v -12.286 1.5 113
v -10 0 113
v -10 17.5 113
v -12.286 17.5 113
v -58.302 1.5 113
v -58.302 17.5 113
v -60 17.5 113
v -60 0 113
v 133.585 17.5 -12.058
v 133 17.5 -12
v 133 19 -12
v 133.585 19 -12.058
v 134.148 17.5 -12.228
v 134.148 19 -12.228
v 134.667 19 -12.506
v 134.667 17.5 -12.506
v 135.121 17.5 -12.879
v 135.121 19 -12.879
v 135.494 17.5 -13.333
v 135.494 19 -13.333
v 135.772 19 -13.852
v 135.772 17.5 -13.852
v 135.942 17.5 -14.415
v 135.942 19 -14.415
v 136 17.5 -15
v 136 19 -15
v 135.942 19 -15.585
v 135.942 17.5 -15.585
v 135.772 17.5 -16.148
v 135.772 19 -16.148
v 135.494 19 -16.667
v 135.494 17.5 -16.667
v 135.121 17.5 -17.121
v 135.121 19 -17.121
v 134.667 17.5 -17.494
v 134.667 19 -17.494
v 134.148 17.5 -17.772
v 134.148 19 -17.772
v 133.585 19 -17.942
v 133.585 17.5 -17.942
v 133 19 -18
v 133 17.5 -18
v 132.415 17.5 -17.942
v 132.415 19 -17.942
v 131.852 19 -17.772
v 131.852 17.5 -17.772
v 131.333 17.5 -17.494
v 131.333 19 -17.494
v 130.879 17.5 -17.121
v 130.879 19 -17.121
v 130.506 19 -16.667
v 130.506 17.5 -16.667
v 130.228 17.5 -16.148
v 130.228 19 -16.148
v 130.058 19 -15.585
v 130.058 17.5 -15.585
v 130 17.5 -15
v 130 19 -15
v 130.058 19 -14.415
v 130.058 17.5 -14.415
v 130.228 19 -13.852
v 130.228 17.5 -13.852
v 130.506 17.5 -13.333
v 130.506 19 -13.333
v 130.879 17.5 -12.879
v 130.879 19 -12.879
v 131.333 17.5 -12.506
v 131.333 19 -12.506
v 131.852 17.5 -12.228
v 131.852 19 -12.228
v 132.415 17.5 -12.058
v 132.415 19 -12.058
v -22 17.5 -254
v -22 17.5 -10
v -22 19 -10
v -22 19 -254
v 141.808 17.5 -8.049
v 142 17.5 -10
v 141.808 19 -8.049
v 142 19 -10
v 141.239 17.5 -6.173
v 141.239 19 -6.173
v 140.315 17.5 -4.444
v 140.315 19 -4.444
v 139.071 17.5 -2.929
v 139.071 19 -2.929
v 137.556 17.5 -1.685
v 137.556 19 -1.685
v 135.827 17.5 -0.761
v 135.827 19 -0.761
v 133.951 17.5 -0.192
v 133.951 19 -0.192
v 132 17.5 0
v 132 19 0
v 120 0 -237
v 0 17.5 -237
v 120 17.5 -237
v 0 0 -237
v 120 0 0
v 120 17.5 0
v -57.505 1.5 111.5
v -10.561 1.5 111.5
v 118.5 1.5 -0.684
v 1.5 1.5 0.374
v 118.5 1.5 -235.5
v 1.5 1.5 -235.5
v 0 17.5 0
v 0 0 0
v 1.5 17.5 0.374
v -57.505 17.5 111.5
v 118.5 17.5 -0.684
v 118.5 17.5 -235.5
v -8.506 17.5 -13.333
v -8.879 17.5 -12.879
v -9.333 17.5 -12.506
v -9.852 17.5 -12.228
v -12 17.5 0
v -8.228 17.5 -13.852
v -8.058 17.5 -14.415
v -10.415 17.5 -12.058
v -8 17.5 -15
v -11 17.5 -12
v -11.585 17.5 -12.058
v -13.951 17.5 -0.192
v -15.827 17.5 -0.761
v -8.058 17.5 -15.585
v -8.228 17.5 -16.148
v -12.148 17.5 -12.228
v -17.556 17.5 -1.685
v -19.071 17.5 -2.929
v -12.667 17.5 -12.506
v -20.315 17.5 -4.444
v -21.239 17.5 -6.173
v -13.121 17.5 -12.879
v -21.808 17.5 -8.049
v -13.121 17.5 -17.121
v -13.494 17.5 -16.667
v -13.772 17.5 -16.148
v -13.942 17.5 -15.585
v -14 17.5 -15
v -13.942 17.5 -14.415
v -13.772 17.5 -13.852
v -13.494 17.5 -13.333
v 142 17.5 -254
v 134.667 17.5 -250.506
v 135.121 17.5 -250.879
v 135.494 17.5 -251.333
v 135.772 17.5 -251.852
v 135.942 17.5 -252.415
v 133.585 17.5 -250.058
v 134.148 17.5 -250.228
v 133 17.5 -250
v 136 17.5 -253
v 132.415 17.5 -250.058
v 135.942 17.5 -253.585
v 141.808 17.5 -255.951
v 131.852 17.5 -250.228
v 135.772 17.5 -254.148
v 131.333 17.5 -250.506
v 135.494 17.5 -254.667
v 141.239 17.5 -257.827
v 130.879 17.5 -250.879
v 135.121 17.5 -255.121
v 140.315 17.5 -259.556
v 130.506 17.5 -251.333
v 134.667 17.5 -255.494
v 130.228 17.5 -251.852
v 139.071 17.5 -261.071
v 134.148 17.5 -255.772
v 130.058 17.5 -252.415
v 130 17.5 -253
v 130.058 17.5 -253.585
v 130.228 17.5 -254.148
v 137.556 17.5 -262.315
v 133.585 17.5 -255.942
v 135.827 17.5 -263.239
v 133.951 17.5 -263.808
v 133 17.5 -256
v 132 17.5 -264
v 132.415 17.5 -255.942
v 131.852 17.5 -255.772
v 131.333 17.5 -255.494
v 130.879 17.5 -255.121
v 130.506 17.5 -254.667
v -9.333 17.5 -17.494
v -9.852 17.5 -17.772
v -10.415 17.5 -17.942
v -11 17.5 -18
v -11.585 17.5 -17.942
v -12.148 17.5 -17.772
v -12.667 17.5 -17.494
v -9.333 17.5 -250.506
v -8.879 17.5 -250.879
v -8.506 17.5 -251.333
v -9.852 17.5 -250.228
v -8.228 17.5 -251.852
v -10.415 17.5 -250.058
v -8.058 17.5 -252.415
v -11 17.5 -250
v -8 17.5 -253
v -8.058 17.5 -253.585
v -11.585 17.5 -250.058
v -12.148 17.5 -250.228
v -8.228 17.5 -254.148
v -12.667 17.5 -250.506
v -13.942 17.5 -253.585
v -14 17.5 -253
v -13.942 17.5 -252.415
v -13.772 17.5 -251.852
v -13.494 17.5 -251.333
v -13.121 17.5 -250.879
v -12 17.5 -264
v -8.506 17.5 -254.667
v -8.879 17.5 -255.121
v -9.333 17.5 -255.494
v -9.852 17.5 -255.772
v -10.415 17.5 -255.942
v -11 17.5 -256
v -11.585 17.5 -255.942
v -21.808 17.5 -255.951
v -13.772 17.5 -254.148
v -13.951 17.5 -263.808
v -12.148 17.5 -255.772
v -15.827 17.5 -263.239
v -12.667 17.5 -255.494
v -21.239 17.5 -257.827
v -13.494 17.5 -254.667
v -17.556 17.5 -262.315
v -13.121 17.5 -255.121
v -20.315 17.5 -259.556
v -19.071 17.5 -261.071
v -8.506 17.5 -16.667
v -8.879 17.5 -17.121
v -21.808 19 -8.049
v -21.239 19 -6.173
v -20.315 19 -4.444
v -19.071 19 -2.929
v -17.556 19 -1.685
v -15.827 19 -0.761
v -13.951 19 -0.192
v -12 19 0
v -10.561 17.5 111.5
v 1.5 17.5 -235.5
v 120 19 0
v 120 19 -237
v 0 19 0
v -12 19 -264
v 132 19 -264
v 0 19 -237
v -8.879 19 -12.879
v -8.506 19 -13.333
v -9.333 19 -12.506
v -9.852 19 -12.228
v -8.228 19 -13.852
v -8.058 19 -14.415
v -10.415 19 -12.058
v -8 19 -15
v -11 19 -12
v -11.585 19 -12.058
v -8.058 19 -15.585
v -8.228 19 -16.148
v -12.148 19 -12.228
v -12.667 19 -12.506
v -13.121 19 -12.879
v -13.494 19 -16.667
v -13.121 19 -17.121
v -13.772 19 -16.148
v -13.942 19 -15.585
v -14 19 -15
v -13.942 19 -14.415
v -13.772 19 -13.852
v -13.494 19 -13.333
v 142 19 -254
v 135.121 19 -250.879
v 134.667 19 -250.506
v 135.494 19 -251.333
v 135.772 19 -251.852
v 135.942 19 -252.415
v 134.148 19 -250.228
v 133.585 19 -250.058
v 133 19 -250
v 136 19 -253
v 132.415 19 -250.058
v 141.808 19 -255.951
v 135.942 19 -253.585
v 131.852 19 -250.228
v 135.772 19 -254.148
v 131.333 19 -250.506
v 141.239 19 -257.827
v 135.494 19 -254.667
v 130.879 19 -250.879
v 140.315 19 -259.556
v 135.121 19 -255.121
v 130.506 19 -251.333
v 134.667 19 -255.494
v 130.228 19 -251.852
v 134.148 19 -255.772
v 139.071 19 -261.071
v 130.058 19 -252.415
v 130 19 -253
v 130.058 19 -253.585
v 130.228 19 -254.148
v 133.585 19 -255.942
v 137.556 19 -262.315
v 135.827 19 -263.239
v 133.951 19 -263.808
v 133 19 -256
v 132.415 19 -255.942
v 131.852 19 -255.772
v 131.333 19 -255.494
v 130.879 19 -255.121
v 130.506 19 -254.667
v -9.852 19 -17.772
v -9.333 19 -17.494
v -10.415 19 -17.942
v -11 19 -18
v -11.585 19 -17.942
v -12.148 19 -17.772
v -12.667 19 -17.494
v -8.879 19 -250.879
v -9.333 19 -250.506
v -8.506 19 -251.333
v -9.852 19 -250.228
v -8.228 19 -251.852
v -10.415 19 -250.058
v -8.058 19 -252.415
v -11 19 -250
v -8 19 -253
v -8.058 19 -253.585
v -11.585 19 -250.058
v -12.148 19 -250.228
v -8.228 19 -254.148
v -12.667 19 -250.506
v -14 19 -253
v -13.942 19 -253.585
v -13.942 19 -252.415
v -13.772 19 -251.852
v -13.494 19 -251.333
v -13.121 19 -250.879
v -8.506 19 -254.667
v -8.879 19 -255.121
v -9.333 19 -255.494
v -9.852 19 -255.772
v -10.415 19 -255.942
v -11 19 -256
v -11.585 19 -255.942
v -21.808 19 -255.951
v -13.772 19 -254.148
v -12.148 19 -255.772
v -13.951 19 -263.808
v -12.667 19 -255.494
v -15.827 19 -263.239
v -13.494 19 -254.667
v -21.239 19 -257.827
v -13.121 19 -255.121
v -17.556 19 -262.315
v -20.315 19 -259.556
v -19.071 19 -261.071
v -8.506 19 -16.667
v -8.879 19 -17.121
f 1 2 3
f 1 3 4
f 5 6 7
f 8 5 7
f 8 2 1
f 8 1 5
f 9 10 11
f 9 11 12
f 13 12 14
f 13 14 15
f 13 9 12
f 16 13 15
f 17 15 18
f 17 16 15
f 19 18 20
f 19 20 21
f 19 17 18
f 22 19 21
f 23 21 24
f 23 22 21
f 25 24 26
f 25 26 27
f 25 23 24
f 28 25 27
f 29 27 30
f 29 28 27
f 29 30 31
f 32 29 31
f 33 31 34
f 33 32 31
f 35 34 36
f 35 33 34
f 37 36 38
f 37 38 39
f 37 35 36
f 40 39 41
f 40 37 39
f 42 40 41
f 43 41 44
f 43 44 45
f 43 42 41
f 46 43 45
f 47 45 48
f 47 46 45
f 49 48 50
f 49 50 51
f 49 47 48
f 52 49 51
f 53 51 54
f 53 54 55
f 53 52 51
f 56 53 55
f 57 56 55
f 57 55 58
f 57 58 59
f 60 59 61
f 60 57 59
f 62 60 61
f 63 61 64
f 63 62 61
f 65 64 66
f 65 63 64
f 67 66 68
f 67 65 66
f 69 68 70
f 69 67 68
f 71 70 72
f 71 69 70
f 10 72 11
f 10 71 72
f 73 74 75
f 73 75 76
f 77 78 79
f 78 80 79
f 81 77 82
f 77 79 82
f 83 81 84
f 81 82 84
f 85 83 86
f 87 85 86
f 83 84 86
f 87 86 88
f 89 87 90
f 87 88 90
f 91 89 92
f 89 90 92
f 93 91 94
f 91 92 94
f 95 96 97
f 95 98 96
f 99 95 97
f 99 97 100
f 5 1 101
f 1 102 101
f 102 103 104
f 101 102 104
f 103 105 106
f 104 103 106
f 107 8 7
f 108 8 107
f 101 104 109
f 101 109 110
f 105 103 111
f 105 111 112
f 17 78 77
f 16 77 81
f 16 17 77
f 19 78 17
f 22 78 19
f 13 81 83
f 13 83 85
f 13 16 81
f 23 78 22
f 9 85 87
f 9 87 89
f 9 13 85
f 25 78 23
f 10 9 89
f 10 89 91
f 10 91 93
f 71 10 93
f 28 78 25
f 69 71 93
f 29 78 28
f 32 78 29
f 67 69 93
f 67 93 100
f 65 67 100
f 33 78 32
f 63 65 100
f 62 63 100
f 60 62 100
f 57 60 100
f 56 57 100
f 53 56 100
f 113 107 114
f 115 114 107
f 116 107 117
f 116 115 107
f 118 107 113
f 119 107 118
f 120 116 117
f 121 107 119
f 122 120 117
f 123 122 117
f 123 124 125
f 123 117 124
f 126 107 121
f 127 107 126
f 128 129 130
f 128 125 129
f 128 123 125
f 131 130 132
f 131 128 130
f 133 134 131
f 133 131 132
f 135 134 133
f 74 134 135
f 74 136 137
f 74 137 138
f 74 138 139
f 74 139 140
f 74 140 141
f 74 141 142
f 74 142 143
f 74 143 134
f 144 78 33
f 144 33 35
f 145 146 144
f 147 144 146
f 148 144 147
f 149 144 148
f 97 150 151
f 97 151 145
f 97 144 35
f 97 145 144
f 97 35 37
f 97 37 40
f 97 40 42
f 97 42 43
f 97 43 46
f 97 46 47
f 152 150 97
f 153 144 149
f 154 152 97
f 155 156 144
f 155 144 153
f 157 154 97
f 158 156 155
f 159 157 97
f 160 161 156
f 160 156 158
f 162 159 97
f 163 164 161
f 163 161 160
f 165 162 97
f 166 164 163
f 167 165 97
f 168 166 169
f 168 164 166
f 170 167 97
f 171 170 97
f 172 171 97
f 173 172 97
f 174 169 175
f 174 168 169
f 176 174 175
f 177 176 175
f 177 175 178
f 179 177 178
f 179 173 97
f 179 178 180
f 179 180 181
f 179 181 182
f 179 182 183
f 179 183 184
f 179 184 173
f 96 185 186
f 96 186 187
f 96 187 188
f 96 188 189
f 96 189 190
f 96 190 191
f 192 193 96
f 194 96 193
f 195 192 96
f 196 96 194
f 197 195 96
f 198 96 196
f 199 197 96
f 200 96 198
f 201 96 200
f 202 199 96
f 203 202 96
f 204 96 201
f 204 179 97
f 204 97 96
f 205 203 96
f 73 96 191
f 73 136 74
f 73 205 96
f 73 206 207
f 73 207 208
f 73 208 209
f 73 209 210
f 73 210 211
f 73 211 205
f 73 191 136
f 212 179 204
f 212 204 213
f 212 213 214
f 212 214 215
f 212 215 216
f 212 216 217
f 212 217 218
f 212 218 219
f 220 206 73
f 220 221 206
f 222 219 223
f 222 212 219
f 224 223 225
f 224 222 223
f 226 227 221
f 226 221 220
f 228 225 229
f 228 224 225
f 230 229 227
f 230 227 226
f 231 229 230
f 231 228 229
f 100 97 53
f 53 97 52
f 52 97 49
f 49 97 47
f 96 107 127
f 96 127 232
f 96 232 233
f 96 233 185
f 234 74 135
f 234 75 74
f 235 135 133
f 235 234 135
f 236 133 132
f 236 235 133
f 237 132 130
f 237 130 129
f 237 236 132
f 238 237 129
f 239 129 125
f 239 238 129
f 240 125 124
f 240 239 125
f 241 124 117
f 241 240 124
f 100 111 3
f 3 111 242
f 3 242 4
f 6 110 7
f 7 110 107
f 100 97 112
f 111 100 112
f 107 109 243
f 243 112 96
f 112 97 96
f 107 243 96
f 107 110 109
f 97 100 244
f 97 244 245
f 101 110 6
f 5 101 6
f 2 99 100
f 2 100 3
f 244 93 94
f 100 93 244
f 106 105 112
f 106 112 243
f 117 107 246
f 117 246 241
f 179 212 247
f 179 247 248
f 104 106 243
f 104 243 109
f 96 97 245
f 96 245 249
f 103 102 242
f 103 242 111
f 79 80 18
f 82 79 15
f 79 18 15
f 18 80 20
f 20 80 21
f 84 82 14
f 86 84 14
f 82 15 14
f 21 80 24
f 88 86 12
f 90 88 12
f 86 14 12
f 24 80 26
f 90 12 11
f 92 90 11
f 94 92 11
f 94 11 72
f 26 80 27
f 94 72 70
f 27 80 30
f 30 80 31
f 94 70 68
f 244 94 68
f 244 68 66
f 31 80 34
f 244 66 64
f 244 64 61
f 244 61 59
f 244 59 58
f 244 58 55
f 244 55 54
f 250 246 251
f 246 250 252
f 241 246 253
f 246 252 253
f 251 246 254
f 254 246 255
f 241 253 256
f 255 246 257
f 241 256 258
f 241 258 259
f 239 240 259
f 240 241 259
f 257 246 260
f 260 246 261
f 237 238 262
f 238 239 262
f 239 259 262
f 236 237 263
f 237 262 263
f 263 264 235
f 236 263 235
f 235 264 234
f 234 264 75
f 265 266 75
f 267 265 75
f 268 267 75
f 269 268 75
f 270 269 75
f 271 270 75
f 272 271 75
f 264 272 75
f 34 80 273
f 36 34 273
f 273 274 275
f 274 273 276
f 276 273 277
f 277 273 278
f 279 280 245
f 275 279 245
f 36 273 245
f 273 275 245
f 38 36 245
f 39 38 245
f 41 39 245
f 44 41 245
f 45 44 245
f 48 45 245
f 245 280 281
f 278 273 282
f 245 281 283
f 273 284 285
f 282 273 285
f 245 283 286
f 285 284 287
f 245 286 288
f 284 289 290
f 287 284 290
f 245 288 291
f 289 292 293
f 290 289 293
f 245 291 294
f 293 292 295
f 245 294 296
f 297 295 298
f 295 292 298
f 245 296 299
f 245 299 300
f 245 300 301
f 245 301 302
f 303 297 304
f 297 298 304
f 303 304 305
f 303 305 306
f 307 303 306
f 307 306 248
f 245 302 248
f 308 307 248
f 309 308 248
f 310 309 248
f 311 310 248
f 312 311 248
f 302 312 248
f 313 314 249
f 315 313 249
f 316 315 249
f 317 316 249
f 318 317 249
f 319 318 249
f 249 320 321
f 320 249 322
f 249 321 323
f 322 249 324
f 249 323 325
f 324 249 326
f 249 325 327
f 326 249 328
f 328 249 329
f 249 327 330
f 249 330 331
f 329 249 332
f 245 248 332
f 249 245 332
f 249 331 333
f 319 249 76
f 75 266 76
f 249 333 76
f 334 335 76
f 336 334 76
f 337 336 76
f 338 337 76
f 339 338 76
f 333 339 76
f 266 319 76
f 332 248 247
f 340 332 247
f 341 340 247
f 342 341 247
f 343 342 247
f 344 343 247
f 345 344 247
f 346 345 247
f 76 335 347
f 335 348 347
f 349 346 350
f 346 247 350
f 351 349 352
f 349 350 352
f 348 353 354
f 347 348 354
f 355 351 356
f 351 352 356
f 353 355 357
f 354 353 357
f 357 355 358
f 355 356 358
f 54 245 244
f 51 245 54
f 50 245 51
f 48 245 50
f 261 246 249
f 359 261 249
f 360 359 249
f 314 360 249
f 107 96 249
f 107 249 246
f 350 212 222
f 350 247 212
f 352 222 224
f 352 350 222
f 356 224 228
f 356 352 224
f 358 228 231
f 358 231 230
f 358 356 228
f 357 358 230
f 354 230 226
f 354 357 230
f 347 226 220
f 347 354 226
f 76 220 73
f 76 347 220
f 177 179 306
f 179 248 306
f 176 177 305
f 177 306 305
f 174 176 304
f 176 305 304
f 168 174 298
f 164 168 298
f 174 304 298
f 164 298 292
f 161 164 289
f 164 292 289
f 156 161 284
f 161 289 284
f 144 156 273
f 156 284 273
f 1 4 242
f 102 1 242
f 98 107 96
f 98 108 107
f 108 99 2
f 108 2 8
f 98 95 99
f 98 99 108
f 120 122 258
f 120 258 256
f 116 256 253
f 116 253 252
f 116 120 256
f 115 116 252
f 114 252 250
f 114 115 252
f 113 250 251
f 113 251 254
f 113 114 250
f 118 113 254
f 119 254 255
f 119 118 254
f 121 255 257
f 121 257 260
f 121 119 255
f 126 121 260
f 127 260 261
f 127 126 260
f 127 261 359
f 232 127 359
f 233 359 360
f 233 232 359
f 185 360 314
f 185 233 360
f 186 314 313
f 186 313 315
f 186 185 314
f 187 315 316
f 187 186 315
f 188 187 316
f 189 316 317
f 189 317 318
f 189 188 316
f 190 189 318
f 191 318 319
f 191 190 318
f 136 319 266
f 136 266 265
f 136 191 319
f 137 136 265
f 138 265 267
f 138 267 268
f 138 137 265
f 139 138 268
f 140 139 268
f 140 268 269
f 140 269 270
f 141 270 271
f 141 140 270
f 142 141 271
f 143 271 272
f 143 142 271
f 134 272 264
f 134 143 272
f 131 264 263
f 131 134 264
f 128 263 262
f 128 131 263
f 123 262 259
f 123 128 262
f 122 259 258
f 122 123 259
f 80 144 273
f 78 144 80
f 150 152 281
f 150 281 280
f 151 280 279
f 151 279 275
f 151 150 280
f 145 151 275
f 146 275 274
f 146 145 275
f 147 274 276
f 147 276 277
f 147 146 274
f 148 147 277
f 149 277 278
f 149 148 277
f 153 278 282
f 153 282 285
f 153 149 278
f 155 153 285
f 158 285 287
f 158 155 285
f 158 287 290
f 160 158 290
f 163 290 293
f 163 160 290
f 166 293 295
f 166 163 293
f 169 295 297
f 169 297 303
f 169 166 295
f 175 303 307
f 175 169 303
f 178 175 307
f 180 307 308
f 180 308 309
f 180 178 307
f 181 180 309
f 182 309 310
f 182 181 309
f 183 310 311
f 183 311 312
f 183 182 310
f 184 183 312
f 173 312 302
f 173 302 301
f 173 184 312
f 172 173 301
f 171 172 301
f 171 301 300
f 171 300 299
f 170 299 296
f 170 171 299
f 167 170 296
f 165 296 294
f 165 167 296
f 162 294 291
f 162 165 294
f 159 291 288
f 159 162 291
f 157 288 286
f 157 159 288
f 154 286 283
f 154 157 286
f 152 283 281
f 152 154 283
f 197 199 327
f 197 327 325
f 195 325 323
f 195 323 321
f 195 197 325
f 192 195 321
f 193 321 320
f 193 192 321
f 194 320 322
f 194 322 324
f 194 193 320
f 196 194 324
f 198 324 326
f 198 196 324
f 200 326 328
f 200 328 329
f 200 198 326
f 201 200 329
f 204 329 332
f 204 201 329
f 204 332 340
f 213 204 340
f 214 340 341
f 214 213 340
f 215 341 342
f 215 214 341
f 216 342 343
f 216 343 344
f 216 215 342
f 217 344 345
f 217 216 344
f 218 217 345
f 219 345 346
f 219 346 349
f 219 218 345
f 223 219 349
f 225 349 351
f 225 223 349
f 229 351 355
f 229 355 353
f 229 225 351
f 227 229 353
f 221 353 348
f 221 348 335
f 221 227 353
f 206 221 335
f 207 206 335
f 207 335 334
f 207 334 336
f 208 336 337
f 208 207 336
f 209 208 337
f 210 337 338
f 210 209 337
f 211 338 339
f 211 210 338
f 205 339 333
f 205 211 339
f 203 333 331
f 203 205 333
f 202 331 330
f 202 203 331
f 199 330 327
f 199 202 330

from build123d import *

# Parameters (mm, degrees)
BOSS_EXTRUDE1_DEPTH = 1.5
BOSS_EXTRUDE2_DEPTH = 16
SKETCH3_R           = 3
BOSS_EXTRUDE3_DEPTH = 1.5
FILLET1_R           = 10


with BuildPart() as part:
    # Sketch1 → Boss-Extrude1 (new body)
    with BuildSketch(Plane(origin=(0, 0, 0), x_dir=(1, 0, 0), z_dir=(0, 1, 0))):
        Polygon((0, 0), (0, 237), (120, 237), (120, 0), (-10, -113), (-60, -113), align=None)
    extrude(amount=BOSS_EXTRUDE1_DEPTH)

    # Sketch2 → Boss-Extrude2 (add)
    with BuildSketch(Plane(origin=(0, 1.5, 0), x_dir=(1, 0, 0), z_dir=(0, 1, 0))):
        Polygon((0, 237), (120, 237), (120, 0), (-10, -113), (-12.286463484, -113), (-10.560799767, -111.5), (118.5, 0.683618259), (118.5, 235.5), (1.5, 235.5), (1.5, -0.373534821), (-57.50520275, -111.5), (-58.301662927, -113), (-60, -113), (0, 0), align=None)
    extrude(amount=BOSS_EXTRUDE2_DEPTH)


with BuildPart() as body_2:
    # Sketch3 → Boss-Extrude3 (new body)
    with BuildSketch(Plane(origin=(0, 17.5, 0), x_dir=(1, 0, 0), z_dir=(0, 1, 0))):
        Polygon((-22, 264), (142, 264), (142, 0), (120, 0), (120, 237), (0, 237), (0, 0), (-22, 0), align=None)
        with Locations(Location((-11, 253, 0), (0, 0, 270))):
            Circle(SKETCH3_R, mode=Mode.SUBTRACT)
        with Locations(Location((133, 253, 0), (0, 0, 270))):
            Circle(SKETCH3_R, mode=Mode.SUBTRACT)
        with Locations(Location((-11, 15, 0), (0, 0, 270))):
            Circle(SKETCH3_R, mode=Mode.SUBTRACT)
        with Locations(Location((133, 15, 0), (0, 0, 270))):
            Circle(SKETCH3_R, mode=Mode.SUBTRACT)
    extrude(amount=BOSS_EXTRUDE3_DEPTH)

    # Fillet1
    fillet1_edges = [body_2.edges().sort_by_distance(p)[0] for p in [
        (-22, 18.25, -264),
        (142, 18.25, -264),
        (142, 18.25, 0),
        (-22, 18.25, 0),
    ]]
    fillet(fillet1_edges, radius=FILLET1_R)


solid = Compound([part.part, body_2.part])
